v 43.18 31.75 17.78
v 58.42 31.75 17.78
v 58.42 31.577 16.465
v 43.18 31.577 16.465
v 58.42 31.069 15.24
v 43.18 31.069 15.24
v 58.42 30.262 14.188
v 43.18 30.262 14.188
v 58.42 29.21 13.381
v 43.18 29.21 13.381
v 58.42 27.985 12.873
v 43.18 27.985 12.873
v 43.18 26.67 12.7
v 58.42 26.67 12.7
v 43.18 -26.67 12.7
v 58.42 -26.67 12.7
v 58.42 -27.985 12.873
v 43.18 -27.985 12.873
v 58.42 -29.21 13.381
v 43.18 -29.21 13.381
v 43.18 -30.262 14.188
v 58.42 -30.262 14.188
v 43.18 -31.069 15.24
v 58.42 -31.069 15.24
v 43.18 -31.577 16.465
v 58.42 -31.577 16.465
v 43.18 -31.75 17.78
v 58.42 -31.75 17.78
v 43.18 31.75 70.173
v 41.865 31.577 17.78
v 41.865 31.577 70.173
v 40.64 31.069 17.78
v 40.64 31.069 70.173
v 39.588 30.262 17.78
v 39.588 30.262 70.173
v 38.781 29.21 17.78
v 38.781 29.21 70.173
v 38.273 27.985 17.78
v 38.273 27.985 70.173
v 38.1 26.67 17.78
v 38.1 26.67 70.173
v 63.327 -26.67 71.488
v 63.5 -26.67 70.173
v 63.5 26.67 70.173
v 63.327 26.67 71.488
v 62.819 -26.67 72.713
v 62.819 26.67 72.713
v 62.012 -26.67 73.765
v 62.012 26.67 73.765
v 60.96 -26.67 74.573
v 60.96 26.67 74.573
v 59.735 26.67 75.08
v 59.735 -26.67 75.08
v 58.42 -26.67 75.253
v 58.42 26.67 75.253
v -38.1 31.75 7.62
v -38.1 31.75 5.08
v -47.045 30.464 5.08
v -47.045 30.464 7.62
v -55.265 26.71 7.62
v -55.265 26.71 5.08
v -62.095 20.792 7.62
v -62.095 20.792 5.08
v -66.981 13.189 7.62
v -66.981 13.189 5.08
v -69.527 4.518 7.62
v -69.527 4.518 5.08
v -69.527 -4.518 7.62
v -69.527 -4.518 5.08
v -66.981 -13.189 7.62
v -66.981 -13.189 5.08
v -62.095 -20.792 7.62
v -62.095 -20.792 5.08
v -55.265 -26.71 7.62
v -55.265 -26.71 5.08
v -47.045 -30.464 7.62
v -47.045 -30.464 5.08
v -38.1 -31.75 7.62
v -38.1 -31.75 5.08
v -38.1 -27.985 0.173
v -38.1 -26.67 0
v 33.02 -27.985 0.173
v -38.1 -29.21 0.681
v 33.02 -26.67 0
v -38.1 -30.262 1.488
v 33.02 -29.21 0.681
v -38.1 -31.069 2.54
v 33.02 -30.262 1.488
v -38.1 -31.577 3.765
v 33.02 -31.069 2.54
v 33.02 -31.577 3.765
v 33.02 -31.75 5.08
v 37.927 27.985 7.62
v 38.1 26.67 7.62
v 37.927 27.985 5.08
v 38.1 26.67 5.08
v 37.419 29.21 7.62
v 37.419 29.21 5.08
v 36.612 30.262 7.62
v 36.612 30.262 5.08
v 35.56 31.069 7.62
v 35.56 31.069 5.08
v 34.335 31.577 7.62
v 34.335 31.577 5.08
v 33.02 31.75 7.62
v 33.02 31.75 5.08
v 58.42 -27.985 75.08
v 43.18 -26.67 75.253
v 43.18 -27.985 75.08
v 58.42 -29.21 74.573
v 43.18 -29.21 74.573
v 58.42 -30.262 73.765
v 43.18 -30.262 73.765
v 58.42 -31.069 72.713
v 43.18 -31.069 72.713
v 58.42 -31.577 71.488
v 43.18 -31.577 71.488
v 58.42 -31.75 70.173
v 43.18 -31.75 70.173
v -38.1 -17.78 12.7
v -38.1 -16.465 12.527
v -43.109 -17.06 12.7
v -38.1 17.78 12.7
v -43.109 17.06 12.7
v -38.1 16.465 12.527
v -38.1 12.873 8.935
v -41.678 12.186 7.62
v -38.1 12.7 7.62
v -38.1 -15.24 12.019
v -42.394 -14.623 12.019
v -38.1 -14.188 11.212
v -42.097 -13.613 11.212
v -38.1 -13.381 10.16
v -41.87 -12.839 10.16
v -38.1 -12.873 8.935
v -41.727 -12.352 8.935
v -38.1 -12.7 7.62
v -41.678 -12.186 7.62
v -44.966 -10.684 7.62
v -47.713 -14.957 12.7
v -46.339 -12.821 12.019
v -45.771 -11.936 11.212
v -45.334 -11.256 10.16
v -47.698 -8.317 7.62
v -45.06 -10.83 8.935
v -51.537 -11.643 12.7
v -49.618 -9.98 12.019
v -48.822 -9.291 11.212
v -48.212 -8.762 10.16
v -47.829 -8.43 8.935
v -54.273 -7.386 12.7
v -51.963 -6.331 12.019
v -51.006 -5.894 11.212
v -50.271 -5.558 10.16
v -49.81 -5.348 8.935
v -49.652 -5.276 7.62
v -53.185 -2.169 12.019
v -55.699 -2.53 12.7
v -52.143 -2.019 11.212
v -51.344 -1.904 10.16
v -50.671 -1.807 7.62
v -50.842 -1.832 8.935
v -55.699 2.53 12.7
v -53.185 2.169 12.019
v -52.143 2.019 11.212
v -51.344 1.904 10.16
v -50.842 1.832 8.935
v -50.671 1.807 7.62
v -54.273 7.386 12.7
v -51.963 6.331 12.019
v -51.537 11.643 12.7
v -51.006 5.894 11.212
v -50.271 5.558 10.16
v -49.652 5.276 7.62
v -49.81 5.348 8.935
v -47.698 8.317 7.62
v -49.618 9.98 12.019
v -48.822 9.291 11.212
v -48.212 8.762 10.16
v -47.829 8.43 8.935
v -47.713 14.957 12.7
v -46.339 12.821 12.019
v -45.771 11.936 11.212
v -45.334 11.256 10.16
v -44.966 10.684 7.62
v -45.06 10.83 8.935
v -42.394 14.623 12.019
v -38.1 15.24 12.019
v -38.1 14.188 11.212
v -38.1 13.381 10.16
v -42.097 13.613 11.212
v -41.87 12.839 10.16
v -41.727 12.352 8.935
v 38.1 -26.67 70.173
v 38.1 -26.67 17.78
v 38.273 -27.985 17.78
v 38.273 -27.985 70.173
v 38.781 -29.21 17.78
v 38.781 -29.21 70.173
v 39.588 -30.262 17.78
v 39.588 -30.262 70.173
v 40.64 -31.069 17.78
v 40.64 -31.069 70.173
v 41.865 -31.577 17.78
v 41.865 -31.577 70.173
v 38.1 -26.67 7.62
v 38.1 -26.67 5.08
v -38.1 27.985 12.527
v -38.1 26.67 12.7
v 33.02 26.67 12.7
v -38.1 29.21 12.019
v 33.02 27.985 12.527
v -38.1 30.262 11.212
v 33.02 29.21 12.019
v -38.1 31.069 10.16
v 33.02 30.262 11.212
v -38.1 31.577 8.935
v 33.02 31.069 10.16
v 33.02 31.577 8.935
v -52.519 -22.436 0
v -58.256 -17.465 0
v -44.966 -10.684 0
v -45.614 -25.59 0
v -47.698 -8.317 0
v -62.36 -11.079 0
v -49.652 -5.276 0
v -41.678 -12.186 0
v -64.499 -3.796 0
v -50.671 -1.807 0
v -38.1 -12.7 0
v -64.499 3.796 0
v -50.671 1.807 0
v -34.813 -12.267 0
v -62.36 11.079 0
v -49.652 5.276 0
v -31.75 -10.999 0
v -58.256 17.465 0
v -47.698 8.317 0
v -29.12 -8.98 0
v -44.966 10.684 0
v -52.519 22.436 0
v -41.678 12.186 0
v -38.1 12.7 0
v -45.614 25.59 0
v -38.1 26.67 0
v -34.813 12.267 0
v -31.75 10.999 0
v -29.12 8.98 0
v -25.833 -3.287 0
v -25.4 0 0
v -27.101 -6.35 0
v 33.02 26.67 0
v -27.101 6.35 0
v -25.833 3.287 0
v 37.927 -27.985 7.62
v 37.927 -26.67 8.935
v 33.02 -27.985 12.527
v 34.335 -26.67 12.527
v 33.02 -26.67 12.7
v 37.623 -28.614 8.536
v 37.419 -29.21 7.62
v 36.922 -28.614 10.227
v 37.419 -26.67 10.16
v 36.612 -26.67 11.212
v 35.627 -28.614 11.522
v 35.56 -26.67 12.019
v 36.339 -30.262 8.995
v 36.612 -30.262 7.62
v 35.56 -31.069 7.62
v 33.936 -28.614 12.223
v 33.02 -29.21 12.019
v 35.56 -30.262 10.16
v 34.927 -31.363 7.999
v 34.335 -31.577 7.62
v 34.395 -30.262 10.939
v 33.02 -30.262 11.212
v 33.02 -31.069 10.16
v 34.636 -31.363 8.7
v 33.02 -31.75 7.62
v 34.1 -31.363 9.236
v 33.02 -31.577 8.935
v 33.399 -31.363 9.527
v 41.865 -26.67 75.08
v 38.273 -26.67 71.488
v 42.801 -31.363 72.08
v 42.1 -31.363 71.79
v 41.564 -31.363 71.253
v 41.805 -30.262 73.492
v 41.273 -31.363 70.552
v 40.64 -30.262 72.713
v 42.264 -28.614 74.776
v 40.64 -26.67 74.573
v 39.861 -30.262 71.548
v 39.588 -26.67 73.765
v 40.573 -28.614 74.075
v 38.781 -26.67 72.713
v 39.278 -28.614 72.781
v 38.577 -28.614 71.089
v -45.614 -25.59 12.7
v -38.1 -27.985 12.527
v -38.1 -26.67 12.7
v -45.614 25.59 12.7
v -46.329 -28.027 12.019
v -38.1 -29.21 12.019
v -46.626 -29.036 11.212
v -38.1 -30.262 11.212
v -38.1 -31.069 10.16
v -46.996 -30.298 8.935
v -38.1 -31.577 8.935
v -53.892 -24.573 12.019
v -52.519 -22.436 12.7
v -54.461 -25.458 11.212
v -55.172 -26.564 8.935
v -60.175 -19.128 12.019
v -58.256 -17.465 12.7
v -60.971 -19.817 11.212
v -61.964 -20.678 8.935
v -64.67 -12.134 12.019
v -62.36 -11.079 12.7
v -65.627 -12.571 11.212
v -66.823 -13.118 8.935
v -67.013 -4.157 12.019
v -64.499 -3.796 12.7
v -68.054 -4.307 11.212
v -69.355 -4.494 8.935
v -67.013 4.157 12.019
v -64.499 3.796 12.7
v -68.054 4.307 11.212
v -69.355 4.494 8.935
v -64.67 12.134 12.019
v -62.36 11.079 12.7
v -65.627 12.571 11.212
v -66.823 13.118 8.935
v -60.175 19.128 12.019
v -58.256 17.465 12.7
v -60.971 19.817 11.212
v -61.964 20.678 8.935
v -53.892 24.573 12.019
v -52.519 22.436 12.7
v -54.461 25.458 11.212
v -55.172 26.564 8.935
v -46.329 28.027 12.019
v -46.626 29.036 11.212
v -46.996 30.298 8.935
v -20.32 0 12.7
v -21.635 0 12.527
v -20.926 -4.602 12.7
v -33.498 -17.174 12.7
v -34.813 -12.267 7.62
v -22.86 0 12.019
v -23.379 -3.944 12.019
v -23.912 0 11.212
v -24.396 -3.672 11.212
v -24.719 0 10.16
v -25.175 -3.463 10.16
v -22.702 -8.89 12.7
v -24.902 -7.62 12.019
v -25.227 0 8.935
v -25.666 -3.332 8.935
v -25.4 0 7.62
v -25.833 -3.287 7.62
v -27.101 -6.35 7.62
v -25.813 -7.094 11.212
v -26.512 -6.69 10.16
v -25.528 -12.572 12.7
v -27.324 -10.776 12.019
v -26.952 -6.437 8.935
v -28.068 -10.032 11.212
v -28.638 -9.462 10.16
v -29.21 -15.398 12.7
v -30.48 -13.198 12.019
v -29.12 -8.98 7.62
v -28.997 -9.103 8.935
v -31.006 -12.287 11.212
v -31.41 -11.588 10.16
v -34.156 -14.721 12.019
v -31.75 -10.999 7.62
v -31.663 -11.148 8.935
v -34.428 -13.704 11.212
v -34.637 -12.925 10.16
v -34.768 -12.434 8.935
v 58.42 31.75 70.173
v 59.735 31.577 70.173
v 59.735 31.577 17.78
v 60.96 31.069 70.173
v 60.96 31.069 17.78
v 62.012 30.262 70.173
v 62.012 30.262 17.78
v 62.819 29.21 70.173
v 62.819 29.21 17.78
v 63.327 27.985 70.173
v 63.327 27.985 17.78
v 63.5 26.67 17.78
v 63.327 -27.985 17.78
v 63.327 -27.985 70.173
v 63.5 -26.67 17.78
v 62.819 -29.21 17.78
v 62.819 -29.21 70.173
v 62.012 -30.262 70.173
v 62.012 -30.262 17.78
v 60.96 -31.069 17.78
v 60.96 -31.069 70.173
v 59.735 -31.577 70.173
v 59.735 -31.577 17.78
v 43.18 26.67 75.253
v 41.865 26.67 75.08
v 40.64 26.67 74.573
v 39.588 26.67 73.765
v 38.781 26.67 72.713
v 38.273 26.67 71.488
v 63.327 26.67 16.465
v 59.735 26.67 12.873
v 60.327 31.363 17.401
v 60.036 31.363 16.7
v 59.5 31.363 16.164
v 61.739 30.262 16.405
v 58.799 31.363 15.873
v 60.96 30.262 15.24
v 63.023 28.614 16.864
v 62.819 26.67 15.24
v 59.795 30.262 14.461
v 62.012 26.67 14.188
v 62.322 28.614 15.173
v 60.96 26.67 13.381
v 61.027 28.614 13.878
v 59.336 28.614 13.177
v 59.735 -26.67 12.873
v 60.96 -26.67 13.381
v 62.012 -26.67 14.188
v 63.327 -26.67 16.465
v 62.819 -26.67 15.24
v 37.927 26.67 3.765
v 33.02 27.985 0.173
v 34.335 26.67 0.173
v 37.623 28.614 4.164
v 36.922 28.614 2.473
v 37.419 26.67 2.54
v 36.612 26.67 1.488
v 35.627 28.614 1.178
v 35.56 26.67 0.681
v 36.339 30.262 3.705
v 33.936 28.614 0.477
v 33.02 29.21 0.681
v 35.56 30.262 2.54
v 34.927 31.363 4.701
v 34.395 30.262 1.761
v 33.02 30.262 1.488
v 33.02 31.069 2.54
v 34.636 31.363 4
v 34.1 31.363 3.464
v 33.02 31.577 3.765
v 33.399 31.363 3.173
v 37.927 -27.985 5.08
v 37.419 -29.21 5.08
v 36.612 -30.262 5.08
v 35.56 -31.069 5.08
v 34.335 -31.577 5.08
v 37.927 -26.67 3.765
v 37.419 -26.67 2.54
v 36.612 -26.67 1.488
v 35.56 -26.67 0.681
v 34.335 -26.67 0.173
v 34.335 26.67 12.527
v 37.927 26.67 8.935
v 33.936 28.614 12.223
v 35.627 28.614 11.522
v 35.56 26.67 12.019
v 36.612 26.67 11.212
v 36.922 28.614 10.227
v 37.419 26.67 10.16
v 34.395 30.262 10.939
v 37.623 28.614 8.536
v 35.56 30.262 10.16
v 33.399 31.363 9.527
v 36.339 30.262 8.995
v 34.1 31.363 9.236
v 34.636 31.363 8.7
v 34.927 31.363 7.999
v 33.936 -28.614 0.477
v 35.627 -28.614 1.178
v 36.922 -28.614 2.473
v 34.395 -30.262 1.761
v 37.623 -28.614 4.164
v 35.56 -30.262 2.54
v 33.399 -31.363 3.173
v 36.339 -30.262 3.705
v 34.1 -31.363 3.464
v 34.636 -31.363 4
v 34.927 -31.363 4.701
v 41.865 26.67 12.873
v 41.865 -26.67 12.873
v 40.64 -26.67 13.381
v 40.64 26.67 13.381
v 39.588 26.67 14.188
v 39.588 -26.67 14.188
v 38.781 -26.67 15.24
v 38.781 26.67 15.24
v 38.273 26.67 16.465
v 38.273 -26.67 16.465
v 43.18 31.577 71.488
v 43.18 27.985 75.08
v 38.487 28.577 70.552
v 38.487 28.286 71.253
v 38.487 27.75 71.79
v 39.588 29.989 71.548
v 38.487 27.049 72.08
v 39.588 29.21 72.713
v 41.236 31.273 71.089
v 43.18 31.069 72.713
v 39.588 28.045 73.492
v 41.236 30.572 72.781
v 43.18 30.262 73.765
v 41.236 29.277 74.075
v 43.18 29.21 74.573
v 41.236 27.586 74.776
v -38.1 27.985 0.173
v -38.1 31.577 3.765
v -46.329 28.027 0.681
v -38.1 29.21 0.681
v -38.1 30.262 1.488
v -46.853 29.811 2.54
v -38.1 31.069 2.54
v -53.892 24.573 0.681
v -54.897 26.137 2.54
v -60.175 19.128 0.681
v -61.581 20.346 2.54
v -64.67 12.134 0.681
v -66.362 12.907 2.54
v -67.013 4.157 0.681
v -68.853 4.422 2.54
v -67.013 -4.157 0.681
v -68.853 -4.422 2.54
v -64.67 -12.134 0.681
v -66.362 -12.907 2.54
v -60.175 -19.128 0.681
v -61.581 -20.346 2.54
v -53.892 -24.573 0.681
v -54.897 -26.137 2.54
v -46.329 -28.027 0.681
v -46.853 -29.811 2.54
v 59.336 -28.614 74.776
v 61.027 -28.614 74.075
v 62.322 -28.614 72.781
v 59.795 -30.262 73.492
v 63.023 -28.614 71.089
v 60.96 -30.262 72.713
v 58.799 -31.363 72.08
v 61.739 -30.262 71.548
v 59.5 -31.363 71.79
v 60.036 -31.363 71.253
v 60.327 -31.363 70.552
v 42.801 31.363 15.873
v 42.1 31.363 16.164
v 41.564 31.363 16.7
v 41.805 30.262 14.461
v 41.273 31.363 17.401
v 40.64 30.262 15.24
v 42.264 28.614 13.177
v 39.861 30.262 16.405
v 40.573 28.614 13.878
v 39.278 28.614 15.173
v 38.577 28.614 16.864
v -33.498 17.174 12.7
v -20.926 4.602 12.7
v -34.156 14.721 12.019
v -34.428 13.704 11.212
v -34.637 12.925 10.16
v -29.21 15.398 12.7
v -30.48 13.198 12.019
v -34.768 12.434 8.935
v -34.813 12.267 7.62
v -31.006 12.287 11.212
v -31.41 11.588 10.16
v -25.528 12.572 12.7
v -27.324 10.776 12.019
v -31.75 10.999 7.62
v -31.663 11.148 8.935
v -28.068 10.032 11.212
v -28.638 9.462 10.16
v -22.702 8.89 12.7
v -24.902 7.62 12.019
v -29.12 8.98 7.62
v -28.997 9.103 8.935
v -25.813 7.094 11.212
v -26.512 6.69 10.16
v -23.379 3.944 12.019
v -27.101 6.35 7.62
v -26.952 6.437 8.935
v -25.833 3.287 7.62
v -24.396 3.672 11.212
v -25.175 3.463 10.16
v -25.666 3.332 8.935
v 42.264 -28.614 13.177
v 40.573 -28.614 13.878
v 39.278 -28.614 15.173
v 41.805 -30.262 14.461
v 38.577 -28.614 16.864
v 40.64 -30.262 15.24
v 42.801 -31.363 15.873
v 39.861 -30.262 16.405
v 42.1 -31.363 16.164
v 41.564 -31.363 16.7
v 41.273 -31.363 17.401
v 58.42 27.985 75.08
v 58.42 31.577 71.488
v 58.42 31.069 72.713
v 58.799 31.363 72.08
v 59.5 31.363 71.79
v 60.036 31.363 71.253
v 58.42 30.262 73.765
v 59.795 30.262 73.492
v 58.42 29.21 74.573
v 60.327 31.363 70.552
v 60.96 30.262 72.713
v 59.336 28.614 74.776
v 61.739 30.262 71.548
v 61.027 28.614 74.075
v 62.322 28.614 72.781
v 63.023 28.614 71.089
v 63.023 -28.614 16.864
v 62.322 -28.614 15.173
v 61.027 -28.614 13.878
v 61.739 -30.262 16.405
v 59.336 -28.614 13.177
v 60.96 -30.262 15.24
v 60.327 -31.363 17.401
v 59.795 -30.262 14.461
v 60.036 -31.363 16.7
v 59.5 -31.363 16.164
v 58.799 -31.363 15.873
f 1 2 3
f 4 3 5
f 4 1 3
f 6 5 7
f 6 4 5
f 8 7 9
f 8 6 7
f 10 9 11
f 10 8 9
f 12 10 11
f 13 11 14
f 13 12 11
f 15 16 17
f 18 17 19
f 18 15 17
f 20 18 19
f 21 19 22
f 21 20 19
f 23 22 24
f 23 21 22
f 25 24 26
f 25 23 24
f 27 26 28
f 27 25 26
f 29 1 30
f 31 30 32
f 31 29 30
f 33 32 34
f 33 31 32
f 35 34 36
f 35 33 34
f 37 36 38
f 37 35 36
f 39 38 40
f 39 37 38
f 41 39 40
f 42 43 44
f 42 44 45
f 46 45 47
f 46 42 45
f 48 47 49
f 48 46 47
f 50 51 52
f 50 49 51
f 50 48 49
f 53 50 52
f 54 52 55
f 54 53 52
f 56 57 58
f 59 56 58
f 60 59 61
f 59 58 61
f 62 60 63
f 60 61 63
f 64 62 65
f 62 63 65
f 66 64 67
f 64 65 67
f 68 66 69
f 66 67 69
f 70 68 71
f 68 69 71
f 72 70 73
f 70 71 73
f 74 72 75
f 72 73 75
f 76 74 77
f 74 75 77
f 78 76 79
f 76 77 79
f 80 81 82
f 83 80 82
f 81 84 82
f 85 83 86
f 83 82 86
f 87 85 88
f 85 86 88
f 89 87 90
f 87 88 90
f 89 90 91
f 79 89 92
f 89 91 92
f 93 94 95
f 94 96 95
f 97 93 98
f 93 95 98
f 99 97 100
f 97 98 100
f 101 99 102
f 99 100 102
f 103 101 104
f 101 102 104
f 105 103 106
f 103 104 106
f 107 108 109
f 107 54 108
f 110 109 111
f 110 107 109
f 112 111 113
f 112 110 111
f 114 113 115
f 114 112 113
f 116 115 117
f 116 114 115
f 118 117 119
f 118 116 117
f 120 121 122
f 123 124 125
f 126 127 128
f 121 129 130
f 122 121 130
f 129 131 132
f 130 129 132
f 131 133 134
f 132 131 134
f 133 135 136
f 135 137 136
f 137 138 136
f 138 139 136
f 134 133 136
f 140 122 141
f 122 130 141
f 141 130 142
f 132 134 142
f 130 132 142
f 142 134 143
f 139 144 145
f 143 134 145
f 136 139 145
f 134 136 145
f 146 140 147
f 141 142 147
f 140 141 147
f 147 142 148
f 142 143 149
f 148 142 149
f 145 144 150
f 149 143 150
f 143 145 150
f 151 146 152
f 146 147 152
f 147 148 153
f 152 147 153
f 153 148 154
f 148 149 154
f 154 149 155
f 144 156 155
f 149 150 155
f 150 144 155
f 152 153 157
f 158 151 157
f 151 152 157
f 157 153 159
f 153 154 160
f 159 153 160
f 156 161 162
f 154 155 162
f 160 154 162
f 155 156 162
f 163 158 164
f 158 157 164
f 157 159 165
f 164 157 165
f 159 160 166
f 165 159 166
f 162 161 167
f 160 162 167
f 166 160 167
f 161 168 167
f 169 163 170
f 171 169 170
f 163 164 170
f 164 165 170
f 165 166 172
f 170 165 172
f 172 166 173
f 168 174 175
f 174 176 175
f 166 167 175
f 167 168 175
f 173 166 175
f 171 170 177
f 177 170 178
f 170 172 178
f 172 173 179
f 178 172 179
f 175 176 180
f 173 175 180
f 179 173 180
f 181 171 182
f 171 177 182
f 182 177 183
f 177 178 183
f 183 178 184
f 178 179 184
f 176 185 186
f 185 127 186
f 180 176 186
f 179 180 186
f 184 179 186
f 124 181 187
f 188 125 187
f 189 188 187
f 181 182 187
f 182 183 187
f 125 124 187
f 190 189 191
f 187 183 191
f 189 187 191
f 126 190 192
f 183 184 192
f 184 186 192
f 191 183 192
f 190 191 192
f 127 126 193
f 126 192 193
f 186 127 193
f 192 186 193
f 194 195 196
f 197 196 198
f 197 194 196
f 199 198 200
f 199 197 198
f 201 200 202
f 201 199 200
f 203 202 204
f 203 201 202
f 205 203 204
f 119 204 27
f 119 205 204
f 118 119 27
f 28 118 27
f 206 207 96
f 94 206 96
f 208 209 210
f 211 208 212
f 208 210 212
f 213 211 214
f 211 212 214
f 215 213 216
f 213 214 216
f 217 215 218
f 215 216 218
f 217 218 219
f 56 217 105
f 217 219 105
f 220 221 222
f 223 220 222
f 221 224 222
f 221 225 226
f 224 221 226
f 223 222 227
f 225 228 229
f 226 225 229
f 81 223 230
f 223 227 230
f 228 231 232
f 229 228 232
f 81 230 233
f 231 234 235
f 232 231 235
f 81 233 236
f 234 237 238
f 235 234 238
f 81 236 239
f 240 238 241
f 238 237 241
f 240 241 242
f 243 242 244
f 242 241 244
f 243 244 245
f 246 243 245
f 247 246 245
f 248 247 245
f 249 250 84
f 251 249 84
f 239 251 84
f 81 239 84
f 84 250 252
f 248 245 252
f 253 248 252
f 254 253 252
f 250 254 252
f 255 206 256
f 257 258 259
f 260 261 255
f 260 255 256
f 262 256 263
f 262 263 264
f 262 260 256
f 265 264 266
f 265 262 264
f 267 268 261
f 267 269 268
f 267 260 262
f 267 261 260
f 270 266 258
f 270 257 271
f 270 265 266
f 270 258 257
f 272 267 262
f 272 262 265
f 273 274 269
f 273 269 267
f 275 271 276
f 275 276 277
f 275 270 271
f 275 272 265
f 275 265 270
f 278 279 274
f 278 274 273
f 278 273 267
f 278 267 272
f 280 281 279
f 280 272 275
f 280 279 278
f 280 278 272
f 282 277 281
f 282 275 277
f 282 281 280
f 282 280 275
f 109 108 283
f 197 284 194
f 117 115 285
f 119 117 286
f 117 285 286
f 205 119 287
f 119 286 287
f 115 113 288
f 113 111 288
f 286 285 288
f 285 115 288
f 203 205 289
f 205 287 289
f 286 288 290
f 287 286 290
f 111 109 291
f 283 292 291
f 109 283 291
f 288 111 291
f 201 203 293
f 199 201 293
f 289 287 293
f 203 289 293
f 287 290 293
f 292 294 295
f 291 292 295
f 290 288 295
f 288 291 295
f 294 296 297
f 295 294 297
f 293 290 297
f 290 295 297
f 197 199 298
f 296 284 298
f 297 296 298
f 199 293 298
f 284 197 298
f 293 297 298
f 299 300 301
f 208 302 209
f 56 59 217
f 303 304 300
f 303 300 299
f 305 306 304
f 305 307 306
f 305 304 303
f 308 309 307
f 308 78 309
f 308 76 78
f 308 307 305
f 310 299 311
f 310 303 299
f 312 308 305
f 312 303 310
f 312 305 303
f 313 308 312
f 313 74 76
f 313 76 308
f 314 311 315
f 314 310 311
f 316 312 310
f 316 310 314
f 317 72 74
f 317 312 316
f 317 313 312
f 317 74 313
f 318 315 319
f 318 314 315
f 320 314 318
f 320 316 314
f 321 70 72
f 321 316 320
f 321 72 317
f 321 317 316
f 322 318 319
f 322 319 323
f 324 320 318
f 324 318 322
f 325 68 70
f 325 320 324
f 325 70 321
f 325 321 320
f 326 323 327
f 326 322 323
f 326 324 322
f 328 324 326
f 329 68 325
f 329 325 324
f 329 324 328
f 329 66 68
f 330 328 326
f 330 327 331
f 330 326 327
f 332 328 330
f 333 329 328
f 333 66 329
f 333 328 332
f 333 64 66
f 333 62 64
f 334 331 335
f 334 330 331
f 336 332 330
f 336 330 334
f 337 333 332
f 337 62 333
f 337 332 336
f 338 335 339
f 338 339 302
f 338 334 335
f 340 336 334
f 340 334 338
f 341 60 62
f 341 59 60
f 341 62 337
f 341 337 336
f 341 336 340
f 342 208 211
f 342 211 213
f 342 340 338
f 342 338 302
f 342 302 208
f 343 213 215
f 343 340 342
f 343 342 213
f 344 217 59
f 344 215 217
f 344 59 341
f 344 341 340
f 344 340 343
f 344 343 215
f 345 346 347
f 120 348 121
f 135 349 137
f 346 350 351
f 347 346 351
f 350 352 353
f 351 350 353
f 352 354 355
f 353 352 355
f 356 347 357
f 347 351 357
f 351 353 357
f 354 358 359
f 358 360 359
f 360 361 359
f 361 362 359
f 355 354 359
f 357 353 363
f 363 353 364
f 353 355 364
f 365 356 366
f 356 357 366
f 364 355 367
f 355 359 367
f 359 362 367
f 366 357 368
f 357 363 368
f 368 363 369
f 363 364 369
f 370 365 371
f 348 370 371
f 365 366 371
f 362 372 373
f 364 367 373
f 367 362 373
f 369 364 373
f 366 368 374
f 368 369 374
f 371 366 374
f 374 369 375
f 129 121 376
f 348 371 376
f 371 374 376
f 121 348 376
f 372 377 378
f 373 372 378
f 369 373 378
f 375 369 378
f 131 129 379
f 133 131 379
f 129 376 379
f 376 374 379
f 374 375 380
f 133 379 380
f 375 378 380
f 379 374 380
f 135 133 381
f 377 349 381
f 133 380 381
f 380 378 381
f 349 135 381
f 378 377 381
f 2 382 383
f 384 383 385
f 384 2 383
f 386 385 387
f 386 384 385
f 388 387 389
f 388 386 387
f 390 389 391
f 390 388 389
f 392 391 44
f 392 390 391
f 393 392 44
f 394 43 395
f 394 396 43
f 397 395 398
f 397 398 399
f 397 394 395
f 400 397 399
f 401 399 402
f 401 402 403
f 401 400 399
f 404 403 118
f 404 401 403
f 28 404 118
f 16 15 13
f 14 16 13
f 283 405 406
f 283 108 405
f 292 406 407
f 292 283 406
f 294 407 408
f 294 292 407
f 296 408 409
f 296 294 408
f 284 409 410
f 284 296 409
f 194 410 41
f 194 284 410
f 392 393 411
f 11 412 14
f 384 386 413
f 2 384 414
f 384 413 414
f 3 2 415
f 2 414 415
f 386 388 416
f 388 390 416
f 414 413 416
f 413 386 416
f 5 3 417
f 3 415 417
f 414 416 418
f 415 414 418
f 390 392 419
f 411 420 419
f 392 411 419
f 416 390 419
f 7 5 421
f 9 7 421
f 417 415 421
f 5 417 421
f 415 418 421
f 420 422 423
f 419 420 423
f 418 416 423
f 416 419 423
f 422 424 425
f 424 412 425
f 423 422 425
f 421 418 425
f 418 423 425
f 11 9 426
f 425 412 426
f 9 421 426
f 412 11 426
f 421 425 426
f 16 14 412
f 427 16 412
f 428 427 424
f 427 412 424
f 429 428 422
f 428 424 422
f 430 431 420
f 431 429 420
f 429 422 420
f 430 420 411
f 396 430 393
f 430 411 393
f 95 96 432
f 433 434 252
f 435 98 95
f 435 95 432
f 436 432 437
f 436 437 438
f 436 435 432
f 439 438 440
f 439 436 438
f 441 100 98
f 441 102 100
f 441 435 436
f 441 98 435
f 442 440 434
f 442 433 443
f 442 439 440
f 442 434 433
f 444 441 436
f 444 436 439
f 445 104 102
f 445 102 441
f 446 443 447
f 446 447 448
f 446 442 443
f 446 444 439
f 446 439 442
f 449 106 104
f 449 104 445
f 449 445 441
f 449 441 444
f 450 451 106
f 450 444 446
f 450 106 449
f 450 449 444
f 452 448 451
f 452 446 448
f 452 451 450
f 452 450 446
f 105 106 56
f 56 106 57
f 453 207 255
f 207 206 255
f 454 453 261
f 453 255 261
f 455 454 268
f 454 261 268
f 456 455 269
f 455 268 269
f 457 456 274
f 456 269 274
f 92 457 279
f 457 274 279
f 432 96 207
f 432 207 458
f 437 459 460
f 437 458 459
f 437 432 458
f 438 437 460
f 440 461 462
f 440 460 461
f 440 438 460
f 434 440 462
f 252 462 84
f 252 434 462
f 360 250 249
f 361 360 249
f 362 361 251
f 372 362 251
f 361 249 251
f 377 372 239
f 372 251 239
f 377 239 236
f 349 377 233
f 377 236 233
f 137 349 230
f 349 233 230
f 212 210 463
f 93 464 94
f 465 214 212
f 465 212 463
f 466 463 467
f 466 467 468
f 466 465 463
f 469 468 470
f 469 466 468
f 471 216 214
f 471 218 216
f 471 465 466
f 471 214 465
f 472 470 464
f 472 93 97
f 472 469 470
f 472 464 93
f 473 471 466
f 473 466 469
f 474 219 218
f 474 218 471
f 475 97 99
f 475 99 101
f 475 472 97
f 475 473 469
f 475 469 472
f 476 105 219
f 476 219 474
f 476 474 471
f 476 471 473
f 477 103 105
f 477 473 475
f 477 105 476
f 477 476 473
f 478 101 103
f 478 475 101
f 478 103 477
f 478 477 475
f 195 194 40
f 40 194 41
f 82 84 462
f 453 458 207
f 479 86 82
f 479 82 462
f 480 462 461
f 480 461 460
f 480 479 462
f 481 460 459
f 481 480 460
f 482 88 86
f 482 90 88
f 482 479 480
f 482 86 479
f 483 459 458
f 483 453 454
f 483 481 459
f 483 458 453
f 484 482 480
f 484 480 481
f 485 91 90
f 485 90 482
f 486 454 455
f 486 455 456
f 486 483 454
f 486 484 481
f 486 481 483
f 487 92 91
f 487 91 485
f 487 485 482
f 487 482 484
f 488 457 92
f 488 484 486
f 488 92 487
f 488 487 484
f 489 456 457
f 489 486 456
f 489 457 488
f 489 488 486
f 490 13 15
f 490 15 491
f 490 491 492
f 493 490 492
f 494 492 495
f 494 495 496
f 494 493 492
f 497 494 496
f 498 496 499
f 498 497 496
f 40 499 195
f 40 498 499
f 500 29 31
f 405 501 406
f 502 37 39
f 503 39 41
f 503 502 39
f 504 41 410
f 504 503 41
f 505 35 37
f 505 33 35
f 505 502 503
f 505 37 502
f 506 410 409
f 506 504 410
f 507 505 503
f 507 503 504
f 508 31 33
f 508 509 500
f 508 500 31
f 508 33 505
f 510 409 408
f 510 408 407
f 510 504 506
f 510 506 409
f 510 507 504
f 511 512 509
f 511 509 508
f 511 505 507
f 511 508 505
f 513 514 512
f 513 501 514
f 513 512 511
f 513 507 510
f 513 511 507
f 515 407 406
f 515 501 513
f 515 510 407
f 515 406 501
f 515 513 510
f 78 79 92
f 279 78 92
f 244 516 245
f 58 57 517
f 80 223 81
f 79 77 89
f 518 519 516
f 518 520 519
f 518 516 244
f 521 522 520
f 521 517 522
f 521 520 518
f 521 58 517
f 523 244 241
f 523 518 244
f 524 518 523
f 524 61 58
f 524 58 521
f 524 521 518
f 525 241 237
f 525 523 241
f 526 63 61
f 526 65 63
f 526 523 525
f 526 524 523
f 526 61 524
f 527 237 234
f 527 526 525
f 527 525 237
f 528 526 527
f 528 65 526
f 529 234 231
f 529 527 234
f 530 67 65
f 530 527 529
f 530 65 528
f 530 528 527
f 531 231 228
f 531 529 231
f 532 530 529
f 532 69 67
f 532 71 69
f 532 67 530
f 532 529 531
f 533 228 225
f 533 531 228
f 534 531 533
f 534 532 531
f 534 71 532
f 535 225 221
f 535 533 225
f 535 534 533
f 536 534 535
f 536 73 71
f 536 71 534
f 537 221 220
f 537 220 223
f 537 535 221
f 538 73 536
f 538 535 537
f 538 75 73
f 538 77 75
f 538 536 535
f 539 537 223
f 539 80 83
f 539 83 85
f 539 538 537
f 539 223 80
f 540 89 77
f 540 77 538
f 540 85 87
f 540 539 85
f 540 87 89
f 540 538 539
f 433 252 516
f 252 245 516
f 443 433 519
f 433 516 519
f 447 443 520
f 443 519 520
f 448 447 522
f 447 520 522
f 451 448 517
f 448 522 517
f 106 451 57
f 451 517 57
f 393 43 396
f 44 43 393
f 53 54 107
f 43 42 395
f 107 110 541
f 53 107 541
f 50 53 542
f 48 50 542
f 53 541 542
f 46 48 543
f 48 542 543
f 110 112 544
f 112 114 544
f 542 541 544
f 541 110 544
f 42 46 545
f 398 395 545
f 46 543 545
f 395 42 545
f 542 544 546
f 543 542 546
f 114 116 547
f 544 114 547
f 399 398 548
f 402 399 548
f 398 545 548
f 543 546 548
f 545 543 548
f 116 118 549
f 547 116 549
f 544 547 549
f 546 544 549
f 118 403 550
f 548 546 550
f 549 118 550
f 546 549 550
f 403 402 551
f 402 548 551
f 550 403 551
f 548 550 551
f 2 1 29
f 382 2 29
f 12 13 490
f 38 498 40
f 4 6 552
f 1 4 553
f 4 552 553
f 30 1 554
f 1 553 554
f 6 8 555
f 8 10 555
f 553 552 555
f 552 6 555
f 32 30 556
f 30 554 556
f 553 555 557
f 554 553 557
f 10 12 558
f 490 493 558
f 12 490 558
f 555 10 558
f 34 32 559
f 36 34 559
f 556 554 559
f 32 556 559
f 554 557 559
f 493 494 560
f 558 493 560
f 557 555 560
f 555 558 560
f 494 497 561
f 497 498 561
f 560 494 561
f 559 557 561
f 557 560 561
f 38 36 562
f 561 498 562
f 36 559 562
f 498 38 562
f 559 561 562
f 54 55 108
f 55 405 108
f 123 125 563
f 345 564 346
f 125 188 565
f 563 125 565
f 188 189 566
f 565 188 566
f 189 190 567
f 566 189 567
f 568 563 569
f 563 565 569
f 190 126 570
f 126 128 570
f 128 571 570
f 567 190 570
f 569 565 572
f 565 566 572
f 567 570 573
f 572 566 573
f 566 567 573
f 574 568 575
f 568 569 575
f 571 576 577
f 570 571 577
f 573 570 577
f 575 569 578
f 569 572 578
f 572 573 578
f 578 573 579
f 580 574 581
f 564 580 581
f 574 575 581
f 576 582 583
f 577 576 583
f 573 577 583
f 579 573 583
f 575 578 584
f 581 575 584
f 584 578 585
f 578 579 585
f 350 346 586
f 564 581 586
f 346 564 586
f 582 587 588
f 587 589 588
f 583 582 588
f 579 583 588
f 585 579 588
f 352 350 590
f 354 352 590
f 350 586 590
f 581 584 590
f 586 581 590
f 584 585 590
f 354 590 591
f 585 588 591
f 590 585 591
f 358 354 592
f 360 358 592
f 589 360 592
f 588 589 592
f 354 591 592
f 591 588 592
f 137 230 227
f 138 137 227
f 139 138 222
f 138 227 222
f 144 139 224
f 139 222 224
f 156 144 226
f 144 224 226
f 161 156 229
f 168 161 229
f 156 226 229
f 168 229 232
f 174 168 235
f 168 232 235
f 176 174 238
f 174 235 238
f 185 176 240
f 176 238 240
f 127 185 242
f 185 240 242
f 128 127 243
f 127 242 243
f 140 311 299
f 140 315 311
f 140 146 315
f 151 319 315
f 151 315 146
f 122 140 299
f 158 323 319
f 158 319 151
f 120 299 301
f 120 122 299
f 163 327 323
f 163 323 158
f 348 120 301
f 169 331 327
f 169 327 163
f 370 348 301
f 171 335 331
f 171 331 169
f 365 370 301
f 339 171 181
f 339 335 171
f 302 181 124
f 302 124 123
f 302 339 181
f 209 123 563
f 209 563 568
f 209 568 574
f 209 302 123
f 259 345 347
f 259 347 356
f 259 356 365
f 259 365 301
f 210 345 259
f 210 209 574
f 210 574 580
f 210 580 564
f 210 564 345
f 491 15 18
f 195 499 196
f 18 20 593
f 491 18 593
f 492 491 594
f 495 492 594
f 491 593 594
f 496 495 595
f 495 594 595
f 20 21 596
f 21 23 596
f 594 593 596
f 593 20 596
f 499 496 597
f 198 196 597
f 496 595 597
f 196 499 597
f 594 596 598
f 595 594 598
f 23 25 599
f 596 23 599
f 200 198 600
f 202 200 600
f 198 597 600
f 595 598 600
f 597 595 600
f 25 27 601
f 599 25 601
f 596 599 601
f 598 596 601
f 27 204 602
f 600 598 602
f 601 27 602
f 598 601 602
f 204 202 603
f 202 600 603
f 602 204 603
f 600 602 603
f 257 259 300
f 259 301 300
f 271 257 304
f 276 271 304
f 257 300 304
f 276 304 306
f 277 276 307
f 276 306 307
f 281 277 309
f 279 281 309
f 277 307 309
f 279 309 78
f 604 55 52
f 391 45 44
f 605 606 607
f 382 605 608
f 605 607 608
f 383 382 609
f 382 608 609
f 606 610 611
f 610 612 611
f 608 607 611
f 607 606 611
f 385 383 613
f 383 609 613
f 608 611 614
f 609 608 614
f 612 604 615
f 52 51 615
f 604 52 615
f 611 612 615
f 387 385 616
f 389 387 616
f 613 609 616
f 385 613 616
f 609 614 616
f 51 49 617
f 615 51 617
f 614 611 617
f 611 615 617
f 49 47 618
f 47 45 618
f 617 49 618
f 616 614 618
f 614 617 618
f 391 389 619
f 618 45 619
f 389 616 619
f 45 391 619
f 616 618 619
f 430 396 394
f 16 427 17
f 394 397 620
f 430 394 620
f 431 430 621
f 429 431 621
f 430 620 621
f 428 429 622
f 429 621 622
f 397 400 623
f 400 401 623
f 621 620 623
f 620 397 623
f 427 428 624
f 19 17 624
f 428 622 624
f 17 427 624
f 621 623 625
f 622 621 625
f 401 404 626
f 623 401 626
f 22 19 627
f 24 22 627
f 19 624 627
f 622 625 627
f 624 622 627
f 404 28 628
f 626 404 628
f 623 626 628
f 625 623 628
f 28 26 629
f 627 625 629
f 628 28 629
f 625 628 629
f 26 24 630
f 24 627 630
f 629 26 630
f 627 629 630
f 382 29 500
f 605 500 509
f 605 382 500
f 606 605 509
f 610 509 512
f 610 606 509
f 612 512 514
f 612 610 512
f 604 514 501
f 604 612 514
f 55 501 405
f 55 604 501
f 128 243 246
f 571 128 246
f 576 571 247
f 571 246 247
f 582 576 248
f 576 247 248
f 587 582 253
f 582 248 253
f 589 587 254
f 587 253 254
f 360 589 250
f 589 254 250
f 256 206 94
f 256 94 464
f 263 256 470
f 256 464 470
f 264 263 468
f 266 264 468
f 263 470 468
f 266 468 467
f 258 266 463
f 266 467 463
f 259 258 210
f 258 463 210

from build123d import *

# Parameters (mm, degrees)
F1_DEPTH = 12.7
F3_DEPTH = 25.4
F4_R     = 5.08
F4_2_R   = 5.08
F5_R     = 5.08
F6_R     = 5.08
F7_R     = 5.08
F8_R     = 5.08
F9_R     = 5.08


with BuildPart() as f1:
    # F0 (on Top) → F1 (new body)
    with BuildSketch(Plane.XY):
        with BuildLine():
            Line((-38.1, 12.7), (-38.1, 31.75))
            ThreePointArc((-38.1, 31.75), (-69.85, 0), (-38.1, -31.75))
            Line((-38.1, -31.75), (-38.1, -12.7))
            ThreePointArc((-38.1, -12.7), (-50.8, 0), (-38.1, 12.7))
        make_face()
        with BuildLine():
            ThreePointArc((-6.35, 0), (-15.6493596973, 22.4506403027), (-38.1, 31.75))
            Line((-38.1, 31.75), (-38.1, 12.7))
            ThreePointArc((-38.1, 12.7), (-29.1197438789, 8.9802561211), (-25.4, 0))
            ThreePointArc((-25.4, 0), (-29.1197438789, -8.9802561211), (-38.1, -12.7))
            Line((-38.1, -12.7), (-38.1, -31.75))
            ThreePointArc((-38.1, -31.75), (-15.6493596973, -22.4506403027), (-6.35, 0))
        make_face()
        with BuildLine():
            Line((38.1, 31.75), (-38.1, 31.75))
            ThreePointArc((-38.1, 31.75), (-15.6493596973, 22.4506403027), (-6.35, 0))
            ThreePointArc((-6.35, 0), (-15.6493596973, -22.4506403027), (-38.1, -31.75))
            Line((-38.1, -31.75), (38.1, -31.75))
            Line((38.1, -31.75), (38.1, 31.75))
        make_face()
    extrude(amount=F1_DEPTH)

    # F4
    f4_edges = [f1.edges().sort_by_distance(p)[0] for p in [
        (38.1, 0, 0),
        (38.1, 0, 12.7),
    ]]
    fillet(f4_edges, radius=F4_R)

    # F8
    f8_edges = [f1.edges().sort_by_distance(p)[0] for p in [
        (-69.85, 0, 0),
    ]]
    fillet(f8_edges, radius=F8_R)

    # F9
    f9_edges = [f1.edges().sort_by_distance(p)[0] for p in [
        (-38.1, -12.7, 12.7),
        (-64.77, 0, 12.7),
        (-2.54, 26.67, 12.7),
        (-2.54, -26.67, 12.7),
        (-2.54, -31.75, 7.62),
        (-38.1, -30.262102, 11.212102),
        (-38.1, 30.262102, 11.212102),
    ]]
    fillet(f9_edges, radius=F9_R)


with BuildPart() as f3:
    # F2 (on face) → F3 (new body)
    with BuildSketch(Plane.YZ.offset(38.1)):
        Polygon((-29.4669698924, 12.7), (31.75, 12.7), (31.75, 75.253136456), (-31.75, 75.253136456), (-31.75, 12.7), align=None)
    extrude(amount=F3_DEPTH)

    # F4#2
    f4_2_edges = [f3.edges().sort_by_distance(p)[0] for p in [
        (63.5, 0, 12.7),
    ]]
    fillet(f4_2_edges, radius=F4_2_R)

    # F5
    f5_edges = [f3.edges().sort_by_distance(p)[0] for p in [
        (38.1, 0, 12.7),
    ]]
    fillet(f5_edges, radius=F5_R)

    # F6
    f6_edges = [f3.edges().sort_by_distance(p)[0] for p in [
        (63.5, 0, 75.253136),
    ]]
    fillet(f6_edges, radius=F6_R)

    # F7
    f7_edges = [f3.edges().sort_by_distance(p)[0] for p in [
        (48.26, 31.75, 75.253136),
        (58.42, 0, 75.253136),
        (38.1, 0, 75.253136),
        (48.26, -31.75, 75.253136),
    ]]
    fillet(f7_edges, radius=F7_R)


solid = Compound([f1.part, f3.part])
